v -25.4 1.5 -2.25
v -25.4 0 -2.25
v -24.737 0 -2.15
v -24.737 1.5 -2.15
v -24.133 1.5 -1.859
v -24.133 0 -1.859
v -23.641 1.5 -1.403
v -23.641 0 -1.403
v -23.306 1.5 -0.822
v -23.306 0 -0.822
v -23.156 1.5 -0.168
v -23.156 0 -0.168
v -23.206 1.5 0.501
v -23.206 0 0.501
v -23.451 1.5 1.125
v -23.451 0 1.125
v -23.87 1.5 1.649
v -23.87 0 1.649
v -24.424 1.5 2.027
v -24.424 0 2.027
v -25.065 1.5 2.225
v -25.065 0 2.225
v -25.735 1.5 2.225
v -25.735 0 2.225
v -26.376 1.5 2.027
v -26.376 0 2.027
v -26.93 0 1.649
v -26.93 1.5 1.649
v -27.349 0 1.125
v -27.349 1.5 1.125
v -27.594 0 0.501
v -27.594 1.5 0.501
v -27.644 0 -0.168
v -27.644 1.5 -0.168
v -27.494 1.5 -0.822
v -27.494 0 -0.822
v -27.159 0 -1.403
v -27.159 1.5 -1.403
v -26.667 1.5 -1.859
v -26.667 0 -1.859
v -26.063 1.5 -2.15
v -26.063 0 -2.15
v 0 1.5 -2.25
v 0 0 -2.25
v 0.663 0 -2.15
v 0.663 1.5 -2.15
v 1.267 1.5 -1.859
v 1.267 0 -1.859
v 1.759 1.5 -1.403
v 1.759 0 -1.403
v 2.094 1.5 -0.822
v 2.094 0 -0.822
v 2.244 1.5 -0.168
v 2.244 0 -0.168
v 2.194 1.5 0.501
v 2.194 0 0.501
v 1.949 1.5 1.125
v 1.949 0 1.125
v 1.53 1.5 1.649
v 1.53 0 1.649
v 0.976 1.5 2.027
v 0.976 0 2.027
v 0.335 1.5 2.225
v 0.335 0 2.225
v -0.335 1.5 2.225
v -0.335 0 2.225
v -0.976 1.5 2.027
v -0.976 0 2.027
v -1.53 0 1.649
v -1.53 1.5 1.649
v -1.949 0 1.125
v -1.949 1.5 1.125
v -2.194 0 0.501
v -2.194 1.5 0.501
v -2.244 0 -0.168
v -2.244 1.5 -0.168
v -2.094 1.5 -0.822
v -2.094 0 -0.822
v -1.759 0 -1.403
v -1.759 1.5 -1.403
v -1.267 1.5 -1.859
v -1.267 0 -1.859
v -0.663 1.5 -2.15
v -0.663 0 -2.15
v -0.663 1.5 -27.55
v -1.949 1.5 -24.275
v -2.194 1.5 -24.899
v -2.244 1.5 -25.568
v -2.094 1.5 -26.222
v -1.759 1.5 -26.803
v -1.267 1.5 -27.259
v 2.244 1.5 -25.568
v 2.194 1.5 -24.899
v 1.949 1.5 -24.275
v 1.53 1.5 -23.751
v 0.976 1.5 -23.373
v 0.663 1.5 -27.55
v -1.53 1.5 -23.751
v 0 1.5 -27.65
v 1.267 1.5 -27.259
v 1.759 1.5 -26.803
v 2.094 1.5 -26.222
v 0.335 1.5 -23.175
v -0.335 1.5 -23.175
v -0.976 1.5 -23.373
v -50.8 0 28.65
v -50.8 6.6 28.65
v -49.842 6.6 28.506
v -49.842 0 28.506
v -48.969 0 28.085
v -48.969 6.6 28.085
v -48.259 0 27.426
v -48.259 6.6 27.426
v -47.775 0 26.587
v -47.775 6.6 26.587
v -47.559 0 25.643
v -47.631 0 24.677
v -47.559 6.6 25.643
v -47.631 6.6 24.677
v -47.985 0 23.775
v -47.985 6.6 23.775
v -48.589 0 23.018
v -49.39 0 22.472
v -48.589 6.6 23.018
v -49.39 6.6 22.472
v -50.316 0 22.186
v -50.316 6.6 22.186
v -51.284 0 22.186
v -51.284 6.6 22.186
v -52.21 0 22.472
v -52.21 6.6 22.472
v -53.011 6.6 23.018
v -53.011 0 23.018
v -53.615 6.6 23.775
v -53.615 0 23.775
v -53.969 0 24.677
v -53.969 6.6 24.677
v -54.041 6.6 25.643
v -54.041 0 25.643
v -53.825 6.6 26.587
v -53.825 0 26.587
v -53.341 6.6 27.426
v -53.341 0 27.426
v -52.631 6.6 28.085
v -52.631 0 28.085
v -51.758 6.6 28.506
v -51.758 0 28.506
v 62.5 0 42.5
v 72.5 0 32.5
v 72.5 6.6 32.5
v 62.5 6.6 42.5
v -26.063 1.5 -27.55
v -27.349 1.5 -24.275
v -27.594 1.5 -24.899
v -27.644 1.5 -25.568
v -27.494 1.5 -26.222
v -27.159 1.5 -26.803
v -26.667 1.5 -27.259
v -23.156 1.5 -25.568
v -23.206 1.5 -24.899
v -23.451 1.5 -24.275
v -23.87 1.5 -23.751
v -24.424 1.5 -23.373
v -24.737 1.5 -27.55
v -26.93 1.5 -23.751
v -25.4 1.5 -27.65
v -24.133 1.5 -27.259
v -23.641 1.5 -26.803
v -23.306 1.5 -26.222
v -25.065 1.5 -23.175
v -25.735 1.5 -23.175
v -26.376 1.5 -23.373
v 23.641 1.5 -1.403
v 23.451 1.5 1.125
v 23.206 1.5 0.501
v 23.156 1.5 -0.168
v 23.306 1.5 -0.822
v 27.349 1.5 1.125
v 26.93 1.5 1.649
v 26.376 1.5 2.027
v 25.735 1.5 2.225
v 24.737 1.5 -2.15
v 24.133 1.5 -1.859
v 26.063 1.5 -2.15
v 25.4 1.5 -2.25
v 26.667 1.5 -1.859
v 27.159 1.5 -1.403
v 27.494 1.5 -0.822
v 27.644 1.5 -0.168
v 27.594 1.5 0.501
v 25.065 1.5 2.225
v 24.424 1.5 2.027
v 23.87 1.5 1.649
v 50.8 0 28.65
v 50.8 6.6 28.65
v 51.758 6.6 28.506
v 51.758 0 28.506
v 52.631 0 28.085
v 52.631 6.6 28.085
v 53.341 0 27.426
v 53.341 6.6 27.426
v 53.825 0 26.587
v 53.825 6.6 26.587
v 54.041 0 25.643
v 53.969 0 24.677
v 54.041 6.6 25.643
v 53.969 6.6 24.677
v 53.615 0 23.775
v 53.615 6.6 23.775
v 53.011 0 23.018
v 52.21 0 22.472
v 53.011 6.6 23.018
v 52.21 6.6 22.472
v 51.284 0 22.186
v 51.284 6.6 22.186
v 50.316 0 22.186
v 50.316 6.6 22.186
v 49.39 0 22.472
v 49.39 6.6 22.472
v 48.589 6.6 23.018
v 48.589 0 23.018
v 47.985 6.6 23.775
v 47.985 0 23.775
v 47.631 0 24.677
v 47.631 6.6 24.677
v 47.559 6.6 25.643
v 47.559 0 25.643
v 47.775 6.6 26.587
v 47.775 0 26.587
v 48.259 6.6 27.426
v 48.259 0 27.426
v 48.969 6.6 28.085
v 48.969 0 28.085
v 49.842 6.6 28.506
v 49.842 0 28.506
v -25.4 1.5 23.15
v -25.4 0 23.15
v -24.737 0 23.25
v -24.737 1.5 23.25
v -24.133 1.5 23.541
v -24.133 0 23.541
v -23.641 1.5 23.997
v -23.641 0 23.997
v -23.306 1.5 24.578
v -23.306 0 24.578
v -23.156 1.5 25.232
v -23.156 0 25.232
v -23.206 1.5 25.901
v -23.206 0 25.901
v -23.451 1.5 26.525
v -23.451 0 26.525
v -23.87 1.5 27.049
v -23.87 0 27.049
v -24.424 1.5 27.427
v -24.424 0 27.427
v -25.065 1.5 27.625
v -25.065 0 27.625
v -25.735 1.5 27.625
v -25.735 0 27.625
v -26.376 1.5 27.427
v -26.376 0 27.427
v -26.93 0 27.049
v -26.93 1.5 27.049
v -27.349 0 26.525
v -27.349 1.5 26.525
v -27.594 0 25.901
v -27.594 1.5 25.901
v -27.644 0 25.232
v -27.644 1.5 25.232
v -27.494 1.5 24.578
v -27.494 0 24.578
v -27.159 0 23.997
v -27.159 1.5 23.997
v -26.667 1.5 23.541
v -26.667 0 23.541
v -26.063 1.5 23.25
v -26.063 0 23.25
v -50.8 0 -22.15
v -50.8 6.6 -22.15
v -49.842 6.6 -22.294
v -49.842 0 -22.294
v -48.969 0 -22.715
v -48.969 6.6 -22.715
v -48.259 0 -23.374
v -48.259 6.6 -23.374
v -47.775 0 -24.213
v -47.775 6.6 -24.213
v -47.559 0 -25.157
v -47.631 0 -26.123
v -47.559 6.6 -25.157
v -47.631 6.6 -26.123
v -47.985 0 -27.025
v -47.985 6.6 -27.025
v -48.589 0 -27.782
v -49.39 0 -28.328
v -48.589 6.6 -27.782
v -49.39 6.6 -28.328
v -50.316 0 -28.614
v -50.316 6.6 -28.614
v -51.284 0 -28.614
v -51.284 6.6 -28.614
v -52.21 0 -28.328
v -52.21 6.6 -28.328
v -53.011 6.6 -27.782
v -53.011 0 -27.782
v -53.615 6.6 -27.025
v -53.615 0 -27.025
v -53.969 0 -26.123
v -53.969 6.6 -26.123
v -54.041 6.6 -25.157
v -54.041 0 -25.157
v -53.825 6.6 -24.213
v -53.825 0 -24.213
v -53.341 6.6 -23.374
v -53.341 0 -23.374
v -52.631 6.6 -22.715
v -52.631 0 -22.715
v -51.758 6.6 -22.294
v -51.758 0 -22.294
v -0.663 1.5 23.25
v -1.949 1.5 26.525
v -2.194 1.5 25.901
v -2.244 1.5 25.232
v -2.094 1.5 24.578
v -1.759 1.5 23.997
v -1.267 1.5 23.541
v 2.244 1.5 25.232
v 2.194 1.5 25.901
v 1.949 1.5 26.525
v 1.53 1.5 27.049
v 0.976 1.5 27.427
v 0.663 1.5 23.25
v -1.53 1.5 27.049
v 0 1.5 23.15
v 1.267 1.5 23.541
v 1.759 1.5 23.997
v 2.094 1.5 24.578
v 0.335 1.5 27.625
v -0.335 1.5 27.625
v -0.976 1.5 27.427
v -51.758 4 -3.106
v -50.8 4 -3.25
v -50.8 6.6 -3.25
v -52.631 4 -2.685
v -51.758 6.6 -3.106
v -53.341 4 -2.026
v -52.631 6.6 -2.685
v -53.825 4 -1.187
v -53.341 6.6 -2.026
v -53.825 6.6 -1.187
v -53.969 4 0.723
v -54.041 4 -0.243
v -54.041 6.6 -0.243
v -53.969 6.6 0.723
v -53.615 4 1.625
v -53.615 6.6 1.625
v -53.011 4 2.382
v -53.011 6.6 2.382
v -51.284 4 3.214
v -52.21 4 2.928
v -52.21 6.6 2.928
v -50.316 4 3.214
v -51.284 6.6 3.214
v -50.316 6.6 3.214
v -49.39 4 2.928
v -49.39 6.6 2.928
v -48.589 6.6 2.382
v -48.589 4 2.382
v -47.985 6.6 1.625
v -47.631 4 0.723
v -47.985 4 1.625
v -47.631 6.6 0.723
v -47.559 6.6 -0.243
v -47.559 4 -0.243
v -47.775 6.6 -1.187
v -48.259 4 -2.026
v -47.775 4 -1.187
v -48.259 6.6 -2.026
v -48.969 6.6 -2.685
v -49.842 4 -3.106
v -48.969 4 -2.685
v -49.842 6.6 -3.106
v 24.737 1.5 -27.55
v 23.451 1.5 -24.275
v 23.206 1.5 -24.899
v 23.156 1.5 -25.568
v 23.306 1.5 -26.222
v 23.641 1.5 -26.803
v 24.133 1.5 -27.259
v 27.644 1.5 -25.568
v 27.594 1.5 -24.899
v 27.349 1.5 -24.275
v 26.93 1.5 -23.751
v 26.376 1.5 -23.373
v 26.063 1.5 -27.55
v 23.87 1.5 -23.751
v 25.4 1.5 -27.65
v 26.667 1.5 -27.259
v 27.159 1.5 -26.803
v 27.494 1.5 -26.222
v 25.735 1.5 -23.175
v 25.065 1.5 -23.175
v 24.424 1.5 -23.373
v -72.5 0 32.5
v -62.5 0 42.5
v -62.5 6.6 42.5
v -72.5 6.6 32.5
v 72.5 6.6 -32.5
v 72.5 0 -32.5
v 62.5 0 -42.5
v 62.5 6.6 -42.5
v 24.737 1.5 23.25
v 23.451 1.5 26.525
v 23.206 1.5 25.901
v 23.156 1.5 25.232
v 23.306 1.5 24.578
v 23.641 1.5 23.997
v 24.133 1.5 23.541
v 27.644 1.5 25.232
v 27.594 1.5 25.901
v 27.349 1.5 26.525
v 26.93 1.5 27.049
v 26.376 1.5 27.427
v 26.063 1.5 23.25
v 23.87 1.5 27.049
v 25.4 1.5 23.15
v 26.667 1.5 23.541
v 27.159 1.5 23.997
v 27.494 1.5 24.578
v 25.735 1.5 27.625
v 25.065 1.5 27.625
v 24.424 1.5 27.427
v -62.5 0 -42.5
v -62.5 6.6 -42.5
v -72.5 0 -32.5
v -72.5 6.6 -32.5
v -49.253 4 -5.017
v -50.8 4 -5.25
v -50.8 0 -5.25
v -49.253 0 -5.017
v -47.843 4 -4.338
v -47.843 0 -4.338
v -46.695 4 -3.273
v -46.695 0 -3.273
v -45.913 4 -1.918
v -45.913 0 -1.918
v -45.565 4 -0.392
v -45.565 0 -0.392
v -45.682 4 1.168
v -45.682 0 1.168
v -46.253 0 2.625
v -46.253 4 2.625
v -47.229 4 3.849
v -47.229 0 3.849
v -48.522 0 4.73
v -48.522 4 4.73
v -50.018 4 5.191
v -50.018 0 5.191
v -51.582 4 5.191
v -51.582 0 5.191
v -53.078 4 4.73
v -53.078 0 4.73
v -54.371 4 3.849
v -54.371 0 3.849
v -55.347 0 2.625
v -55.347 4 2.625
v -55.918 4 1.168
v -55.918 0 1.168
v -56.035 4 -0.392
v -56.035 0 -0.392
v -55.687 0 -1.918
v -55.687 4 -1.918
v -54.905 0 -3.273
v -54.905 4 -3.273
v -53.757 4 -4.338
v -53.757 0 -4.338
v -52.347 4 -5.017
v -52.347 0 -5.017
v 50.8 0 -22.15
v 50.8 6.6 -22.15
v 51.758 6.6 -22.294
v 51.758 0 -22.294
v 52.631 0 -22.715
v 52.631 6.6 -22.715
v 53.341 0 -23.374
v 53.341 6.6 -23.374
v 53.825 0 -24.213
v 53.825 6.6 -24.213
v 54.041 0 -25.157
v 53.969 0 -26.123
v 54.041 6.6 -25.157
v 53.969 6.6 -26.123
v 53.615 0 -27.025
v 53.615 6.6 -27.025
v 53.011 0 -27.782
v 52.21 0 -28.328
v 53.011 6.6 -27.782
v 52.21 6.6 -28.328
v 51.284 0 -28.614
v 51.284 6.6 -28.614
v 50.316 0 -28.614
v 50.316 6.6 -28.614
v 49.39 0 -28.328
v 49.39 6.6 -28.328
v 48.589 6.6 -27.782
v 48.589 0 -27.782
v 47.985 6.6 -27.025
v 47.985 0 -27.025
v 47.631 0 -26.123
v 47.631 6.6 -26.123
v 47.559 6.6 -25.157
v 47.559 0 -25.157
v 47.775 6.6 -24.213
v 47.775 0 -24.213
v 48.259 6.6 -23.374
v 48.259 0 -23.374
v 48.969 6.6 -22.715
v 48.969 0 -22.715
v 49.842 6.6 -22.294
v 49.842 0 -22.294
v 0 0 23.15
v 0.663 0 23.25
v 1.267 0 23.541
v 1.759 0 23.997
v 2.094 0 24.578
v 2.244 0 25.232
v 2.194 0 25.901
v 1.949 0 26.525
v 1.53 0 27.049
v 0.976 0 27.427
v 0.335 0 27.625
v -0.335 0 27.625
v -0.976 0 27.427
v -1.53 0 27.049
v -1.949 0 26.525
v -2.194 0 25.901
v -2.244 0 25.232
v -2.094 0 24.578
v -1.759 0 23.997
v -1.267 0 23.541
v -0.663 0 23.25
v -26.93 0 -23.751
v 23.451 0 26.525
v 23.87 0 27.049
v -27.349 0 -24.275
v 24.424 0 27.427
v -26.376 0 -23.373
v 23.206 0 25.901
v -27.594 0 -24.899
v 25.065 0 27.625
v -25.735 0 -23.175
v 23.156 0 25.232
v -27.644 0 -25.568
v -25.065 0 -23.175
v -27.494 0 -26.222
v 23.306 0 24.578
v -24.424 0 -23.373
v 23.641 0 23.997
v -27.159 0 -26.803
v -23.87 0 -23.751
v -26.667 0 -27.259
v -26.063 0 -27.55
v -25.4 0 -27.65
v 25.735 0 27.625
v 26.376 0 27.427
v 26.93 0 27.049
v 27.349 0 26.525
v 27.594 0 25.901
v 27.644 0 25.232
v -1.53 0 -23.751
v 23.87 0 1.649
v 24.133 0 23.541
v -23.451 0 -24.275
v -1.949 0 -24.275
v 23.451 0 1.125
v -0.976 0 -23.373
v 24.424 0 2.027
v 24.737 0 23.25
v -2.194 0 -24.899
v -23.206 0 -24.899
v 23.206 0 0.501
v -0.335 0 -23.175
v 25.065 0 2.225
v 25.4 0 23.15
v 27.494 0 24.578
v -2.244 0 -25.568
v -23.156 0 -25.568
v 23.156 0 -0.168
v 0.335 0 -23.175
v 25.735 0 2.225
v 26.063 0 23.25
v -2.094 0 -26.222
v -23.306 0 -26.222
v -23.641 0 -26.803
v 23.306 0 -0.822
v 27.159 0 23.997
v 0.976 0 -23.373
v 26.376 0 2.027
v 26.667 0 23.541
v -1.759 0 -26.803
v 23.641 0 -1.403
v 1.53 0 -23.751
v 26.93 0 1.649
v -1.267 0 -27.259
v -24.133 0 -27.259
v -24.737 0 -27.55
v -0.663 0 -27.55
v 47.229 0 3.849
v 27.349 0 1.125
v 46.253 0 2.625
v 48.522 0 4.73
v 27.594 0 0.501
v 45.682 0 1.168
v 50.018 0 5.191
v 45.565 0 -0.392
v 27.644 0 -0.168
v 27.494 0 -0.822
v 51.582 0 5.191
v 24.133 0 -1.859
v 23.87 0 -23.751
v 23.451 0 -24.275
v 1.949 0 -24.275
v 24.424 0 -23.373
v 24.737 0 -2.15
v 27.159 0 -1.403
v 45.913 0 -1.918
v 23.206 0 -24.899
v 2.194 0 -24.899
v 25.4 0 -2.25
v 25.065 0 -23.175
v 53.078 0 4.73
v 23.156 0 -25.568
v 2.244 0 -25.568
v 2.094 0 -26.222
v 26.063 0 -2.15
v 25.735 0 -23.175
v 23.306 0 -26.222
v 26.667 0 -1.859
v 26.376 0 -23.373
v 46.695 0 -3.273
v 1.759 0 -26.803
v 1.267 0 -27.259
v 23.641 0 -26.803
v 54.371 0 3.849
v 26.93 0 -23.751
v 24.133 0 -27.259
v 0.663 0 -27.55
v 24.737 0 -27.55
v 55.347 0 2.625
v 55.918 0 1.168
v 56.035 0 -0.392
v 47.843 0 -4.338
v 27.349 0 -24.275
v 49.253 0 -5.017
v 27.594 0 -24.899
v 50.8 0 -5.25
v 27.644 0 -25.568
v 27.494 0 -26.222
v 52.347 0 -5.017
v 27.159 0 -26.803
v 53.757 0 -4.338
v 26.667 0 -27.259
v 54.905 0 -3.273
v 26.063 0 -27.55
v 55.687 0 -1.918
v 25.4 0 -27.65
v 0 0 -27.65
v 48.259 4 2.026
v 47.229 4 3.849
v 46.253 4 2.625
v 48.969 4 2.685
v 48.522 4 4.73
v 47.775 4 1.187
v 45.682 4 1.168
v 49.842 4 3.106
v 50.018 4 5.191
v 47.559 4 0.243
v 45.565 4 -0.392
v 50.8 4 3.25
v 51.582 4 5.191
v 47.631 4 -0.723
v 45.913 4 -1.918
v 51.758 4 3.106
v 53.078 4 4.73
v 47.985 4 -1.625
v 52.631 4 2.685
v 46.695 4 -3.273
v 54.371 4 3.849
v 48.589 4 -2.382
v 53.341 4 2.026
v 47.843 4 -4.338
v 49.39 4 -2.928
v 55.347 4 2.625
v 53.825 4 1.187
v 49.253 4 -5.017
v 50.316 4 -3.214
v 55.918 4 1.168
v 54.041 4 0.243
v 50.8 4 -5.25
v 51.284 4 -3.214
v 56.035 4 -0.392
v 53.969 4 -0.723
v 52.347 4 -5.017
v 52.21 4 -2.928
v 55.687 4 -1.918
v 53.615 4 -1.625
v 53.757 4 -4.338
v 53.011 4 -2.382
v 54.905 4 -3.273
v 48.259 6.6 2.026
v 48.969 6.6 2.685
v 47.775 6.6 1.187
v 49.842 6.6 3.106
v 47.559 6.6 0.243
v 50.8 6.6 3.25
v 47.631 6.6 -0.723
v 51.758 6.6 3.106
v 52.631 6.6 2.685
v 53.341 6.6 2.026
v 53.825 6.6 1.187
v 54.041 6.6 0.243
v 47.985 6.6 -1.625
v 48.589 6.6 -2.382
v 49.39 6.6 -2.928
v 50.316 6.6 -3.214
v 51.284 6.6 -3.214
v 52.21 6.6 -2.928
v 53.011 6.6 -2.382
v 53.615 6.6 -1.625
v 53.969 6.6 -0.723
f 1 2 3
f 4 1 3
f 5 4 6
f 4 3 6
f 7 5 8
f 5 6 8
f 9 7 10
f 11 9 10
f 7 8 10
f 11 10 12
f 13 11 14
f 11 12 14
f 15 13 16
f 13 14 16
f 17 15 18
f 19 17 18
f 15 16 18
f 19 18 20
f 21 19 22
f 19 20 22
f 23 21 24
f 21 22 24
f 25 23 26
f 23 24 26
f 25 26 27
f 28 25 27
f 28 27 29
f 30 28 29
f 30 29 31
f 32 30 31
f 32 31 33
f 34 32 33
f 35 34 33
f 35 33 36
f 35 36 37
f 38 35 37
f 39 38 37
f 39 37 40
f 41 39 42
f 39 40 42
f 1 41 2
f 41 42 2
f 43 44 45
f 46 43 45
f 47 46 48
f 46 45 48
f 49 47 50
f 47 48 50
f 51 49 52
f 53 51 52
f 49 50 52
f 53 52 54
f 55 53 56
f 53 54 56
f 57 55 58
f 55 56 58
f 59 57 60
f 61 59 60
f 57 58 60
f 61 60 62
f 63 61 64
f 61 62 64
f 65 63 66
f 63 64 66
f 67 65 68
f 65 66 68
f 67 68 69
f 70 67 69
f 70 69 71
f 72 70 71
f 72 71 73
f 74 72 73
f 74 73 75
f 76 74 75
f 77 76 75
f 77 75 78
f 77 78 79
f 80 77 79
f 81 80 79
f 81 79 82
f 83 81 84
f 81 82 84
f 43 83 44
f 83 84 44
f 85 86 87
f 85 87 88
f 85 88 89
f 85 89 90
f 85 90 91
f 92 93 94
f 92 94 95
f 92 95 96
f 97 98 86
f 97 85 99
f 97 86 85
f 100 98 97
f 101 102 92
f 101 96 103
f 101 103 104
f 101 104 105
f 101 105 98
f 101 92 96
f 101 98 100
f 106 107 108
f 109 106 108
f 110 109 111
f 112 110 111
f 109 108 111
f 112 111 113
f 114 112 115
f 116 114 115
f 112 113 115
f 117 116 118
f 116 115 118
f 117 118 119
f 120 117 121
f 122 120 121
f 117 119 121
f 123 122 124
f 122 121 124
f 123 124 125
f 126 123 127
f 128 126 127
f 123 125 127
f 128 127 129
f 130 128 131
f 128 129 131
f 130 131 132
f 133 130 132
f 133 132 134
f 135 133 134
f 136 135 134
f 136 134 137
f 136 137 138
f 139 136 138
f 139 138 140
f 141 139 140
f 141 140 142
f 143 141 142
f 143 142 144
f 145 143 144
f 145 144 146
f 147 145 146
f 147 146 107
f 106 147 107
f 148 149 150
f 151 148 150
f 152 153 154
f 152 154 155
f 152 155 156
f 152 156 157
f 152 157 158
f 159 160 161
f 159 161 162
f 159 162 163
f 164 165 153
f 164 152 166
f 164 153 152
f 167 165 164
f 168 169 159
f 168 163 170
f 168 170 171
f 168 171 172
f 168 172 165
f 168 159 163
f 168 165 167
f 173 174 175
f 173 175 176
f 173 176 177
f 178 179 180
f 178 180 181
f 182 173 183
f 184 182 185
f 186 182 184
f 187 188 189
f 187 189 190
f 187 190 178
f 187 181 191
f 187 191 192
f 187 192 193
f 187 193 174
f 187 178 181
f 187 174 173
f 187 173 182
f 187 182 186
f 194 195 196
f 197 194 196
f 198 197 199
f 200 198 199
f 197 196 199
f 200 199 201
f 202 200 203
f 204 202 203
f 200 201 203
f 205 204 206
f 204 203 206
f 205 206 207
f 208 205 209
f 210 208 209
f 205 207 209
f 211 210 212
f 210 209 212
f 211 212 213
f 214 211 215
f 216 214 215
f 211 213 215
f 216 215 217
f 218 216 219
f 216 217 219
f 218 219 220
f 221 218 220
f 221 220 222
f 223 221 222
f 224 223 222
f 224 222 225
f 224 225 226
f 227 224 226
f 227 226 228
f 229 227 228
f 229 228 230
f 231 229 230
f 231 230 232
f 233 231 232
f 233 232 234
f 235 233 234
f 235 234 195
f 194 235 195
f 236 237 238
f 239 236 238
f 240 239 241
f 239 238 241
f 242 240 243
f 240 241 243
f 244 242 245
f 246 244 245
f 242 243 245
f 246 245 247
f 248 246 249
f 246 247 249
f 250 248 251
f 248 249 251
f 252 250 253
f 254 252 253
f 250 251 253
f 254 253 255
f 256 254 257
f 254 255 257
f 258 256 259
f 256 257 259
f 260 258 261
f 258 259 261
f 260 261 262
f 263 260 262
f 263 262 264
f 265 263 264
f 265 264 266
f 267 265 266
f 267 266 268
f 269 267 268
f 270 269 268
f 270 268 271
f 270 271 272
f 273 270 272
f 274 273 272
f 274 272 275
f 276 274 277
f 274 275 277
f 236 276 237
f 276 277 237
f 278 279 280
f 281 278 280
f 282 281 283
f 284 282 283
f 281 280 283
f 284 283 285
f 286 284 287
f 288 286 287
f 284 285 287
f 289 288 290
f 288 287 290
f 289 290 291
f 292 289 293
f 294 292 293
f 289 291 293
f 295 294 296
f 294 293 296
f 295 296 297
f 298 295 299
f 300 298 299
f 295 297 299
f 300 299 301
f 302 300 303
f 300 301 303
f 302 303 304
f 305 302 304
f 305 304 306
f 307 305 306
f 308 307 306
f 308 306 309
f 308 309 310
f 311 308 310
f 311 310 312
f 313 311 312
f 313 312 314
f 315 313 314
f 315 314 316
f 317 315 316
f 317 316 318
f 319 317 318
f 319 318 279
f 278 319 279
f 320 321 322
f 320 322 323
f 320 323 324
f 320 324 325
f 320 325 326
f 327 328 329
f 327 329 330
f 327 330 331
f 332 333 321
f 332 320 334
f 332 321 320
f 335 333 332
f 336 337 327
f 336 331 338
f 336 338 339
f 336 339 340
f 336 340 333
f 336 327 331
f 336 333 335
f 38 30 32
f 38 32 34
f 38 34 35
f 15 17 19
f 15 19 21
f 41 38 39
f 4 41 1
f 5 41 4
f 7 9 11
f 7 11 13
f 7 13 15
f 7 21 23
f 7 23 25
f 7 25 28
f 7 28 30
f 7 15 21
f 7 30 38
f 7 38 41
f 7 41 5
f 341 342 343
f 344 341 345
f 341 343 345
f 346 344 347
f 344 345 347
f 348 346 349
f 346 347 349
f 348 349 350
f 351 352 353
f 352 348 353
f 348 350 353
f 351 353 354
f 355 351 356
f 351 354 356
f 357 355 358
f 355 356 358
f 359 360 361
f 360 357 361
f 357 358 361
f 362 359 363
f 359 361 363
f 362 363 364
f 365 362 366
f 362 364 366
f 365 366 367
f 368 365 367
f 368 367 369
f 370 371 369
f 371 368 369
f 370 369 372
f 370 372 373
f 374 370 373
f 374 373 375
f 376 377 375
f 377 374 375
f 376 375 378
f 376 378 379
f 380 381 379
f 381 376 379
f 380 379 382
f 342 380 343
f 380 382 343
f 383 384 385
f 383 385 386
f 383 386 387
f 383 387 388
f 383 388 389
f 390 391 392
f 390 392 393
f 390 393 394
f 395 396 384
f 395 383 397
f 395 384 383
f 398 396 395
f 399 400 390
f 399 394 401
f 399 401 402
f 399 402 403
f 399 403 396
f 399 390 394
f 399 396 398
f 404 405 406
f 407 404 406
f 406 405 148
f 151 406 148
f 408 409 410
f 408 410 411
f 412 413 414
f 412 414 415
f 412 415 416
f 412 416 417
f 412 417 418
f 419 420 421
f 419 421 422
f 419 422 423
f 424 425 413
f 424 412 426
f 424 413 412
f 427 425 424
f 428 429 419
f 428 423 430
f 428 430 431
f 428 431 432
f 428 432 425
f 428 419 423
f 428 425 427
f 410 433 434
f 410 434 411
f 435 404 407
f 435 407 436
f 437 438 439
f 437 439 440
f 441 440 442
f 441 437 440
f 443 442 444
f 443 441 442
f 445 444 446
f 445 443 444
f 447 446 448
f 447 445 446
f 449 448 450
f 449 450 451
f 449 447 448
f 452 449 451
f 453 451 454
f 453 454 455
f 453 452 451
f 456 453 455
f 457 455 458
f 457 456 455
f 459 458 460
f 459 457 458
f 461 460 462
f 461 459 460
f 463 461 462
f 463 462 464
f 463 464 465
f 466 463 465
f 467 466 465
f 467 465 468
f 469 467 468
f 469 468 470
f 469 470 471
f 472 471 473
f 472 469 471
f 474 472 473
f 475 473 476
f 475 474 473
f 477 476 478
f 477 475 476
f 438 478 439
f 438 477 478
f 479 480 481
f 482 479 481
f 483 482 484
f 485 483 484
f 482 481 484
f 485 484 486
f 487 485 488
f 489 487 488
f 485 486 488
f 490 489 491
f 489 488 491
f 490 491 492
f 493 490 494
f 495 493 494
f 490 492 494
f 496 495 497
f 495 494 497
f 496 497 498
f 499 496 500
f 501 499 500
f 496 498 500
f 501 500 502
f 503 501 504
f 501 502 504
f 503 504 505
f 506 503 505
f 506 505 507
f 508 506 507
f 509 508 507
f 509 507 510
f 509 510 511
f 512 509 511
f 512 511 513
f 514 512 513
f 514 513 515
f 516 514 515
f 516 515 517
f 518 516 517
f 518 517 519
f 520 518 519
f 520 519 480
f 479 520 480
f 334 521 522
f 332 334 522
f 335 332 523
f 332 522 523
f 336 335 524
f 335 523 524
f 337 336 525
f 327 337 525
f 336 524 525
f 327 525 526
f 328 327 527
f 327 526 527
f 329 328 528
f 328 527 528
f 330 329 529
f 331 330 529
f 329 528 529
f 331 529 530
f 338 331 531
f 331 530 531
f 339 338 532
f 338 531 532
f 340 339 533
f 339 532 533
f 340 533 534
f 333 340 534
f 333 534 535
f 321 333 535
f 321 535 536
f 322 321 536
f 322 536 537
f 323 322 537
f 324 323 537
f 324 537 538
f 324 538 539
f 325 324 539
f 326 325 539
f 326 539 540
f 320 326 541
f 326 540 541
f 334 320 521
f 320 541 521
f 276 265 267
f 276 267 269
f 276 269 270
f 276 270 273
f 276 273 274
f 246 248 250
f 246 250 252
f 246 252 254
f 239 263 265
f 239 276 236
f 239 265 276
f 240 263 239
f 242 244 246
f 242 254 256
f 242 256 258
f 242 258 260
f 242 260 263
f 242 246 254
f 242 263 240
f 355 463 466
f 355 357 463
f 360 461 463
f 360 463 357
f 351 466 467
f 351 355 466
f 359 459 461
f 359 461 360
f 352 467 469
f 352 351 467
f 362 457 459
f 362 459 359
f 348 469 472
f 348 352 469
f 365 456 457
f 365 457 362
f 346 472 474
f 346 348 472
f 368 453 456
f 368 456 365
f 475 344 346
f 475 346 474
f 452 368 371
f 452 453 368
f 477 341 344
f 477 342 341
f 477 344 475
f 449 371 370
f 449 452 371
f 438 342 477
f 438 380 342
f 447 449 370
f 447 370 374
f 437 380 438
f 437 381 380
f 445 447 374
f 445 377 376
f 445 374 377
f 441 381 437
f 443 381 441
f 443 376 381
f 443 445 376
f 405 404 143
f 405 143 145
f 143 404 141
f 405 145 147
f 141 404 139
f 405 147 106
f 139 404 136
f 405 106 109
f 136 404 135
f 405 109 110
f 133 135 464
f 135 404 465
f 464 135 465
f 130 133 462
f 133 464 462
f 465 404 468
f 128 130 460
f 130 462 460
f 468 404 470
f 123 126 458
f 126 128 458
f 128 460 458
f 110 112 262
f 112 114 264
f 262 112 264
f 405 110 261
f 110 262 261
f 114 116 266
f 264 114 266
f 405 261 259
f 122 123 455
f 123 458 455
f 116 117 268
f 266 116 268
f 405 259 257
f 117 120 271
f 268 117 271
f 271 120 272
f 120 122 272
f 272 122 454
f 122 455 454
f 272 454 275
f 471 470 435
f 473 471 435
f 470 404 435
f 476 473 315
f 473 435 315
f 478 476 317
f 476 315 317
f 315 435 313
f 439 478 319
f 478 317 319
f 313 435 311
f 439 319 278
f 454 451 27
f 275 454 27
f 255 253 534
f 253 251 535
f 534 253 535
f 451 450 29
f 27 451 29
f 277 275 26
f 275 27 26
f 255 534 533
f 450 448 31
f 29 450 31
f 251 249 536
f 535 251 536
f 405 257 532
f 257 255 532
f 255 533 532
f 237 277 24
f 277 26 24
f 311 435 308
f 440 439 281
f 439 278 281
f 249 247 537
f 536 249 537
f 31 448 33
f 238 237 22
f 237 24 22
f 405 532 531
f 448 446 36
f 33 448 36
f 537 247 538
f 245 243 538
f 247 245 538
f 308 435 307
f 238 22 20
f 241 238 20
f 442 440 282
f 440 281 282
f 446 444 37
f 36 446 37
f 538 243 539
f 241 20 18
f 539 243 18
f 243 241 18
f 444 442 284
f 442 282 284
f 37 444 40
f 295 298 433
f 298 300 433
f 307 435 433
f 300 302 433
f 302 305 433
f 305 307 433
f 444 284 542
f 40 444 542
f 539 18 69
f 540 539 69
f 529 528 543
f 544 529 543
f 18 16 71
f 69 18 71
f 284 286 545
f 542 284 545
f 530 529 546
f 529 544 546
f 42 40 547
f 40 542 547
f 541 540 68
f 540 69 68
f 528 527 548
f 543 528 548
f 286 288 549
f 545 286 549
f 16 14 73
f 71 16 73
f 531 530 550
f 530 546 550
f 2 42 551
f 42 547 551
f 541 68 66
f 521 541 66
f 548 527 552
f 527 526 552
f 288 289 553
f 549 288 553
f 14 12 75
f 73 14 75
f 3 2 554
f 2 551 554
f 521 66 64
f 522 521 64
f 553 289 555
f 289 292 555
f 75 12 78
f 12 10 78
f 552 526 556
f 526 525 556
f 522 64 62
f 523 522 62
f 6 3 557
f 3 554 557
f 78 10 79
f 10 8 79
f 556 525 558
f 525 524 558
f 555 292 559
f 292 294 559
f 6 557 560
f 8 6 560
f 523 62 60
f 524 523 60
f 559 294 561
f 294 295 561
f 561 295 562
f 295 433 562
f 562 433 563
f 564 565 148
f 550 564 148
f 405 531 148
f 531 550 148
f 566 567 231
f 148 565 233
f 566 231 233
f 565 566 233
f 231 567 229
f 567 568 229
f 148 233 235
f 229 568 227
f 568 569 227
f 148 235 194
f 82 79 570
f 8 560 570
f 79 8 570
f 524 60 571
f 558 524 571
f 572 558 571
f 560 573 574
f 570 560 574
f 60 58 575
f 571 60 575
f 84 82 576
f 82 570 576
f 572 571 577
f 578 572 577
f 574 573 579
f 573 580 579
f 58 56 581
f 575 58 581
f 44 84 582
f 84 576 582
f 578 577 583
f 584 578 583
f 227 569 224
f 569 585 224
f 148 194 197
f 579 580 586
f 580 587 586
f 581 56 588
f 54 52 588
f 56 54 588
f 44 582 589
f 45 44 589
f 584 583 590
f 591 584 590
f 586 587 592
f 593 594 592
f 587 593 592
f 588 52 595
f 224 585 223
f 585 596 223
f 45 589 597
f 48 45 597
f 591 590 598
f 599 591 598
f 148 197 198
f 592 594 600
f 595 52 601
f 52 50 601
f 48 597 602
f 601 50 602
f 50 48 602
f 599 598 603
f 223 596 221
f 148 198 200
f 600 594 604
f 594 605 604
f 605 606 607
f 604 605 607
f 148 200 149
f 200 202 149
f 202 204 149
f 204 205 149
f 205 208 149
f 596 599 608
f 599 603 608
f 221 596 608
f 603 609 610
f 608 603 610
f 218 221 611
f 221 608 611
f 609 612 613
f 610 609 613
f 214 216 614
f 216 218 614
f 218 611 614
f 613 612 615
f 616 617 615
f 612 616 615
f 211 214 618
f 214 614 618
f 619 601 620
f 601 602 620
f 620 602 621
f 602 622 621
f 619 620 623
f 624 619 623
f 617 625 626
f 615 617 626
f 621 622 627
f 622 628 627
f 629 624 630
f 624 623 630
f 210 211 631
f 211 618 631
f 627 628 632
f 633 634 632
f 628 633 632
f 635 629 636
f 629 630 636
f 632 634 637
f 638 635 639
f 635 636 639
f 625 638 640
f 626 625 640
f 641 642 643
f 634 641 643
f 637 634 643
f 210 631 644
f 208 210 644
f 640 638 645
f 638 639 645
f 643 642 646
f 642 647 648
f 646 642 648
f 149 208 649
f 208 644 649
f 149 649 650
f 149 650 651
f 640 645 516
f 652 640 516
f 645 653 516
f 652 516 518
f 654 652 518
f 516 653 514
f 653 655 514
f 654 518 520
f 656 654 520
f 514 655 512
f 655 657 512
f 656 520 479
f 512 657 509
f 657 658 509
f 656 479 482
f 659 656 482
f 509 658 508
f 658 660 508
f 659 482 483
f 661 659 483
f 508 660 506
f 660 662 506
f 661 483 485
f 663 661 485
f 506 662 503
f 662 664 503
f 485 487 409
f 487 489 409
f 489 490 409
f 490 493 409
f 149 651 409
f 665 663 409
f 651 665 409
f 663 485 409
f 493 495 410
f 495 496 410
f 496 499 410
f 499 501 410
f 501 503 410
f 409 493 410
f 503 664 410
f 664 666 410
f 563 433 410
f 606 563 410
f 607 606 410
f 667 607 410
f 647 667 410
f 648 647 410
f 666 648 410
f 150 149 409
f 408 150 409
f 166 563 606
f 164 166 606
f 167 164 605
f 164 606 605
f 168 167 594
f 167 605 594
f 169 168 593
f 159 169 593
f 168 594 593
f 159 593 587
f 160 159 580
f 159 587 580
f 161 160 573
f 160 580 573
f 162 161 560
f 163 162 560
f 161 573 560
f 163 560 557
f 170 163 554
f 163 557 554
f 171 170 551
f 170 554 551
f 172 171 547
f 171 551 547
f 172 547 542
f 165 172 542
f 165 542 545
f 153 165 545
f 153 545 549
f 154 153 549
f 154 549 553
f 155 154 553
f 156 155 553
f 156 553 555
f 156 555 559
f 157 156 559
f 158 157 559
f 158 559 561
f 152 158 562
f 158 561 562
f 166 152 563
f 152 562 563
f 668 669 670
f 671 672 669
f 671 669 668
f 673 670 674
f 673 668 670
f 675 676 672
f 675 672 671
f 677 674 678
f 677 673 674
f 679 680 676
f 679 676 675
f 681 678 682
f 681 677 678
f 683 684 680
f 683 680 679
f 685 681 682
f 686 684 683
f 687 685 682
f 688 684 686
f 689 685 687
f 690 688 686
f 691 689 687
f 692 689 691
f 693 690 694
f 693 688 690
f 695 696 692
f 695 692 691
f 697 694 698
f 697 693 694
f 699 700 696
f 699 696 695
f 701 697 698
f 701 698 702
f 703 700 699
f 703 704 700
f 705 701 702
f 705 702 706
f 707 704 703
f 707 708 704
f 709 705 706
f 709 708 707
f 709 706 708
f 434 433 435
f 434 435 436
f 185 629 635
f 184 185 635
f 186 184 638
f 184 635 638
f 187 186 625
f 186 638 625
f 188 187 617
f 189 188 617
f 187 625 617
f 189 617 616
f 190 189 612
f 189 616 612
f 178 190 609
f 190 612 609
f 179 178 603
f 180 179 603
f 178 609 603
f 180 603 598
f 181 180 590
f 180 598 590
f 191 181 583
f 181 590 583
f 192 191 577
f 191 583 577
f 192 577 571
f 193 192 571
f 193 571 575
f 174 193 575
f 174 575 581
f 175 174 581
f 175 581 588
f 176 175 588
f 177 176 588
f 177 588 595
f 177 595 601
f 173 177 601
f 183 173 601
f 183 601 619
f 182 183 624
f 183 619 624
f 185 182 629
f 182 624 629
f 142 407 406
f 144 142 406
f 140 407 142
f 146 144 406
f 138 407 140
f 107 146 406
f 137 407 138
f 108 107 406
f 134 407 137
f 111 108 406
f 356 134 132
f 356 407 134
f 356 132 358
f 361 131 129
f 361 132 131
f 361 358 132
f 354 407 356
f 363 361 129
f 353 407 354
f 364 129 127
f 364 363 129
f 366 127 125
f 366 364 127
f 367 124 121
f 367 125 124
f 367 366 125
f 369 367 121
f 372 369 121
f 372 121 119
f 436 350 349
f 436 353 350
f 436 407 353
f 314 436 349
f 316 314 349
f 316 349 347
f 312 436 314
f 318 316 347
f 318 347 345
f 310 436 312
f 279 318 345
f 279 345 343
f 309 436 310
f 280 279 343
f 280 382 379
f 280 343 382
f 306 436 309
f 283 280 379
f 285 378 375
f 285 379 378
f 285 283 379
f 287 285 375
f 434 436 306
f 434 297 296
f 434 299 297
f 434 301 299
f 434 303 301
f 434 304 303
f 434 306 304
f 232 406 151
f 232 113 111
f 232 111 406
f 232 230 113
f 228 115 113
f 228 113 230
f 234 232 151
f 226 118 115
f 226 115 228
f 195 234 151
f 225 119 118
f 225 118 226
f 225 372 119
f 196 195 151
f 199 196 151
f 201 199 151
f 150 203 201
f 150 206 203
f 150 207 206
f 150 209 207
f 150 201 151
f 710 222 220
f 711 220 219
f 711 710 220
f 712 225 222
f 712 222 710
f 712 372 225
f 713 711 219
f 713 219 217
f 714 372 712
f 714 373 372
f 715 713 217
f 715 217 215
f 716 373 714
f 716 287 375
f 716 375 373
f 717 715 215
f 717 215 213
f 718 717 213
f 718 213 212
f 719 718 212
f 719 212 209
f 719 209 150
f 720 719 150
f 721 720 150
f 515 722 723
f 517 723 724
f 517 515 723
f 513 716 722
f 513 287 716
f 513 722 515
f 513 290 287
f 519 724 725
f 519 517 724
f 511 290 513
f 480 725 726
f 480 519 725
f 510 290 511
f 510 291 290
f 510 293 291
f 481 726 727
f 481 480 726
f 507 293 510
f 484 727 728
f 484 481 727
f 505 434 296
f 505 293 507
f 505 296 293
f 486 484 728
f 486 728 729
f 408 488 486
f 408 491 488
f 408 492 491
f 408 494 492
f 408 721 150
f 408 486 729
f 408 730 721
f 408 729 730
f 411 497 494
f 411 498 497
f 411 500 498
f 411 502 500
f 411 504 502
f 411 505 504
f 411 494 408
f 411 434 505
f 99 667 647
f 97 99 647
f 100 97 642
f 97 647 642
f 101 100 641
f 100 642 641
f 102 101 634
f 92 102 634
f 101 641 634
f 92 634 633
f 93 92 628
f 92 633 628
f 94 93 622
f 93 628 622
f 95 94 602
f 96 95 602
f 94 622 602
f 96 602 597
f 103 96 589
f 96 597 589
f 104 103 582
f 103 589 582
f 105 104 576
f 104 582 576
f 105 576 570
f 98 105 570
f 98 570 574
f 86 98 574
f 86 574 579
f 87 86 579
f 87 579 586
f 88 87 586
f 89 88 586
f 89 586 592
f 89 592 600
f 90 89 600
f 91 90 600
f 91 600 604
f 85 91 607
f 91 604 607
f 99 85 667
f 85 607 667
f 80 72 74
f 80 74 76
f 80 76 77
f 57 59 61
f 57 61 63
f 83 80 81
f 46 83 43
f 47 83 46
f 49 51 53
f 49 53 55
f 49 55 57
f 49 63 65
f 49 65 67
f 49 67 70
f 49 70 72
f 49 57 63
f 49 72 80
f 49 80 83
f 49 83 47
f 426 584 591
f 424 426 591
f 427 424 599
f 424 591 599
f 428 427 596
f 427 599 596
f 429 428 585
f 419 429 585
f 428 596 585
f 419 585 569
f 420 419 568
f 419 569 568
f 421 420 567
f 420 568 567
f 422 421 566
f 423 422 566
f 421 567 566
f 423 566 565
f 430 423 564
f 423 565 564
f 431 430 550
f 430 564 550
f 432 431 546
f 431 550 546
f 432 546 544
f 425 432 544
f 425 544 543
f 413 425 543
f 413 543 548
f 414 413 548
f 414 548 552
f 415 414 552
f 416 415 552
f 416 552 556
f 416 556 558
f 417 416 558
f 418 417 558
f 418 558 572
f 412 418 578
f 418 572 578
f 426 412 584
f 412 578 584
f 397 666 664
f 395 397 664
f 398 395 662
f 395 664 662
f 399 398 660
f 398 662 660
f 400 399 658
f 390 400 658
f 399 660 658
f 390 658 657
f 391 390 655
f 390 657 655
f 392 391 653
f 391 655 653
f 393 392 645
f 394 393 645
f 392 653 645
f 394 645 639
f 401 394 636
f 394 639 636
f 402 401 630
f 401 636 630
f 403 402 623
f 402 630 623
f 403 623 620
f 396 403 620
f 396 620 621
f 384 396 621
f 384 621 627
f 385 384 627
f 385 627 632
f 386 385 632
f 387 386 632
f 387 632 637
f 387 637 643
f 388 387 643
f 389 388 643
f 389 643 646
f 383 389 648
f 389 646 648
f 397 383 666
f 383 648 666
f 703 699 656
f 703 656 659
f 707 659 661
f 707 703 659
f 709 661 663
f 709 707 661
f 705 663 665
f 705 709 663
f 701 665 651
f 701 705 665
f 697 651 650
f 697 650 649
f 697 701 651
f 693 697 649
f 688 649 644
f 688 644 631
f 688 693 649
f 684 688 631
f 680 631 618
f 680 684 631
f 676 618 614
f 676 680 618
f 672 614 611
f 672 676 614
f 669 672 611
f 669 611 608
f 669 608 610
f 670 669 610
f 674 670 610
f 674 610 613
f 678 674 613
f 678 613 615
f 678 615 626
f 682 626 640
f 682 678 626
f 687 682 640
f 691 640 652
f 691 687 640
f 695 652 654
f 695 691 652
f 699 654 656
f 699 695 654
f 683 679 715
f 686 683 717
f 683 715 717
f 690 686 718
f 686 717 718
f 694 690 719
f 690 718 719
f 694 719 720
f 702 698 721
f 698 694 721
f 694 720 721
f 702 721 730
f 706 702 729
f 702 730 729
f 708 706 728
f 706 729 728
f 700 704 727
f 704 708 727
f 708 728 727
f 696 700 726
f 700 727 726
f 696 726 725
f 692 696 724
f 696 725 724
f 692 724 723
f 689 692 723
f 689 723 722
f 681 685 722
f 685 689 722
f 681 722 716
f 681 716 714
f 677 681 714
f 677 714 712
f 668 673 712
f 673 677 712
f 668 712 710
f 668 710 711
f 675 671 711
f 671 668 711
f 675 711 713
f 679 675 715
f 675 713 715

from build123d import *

# Parameters (mm, degrees)
SKETCH1_W           = 145
SKETCH1_H           = 85
BOSS_EXTRUDE1_DEPTH = 6.6
SKETCH2_R           = 3.25
CUT_EXTRUDE1_DEPTH  = 85.297449546
CHAMFER1_SIZE       = 10
CUT_EXTRUDE2_START  = -4
SKETCH3_R           = 5.25
SKETCH3_R_2         = 3.25
CUT_EXTRUDE2_DEPTH  = 4
SKETCH4_R           = 2.25
CUT_EXTRUDE3_DEPTH  = 1.5


with BuildPart() as part:
    # Sketch1 → Boss-Extrude1 (new body)
    with BuildSketch(Plane(origin=(0, 0, 0), x_dir=(1, 0, 0), z_dir=(0, 1, 0))):
        Rectangle(SKETCH1_W, SKETCH1_H)
    extrude(amount=BOSS_EXTRUDE1_DEPTH)

    # Sketch2 → Cut-Extrude1 (cut, through all)
    with BuildSketch(Plane(origin=(0, 6.6, 0), x_dir=(1, 0, 0), z_dir=(0, 1, 0))):
        with Locations(Location((-50.8, 25.4, 0), (0, 0, 270))):
            Circle(SKETCH2_R)
        with Locations(Location((50.8, 25.4, 0), (0, 0, 270))):
            Circle(SKETCH2_R)
        with Locations(Location((50.8, -25.4, 0), (0, 0, 270))):
            Circle(SKETCH2_R)
        with Locations(Location((-50.8, -25.4, 0), (0, 0, 270))):
            Circle(SKETCH2_R)
        with Locations(Location((50.8, 0, 0), (0, 0, 270))):
            Circle(SKETCH2_R)
        with Locations(Location((-50.8, 0, 0), (0, 0, 90))):
            Circle(SKETCH2_R)
    extrude(amount=-CUT_EXTRUDE1_DEPTH, mode=Mode.SUBTRACT)

    # Chamfer1
    chamfer1_edges = [part.edges().sort_by_distance(p)[0] for p in [
        (72.5, 3.3, 42.5),
        (-72.5, 3.3, 42.5),
        (-72.5, 3.3, -42.5),
        (72.5, 3.3, -42.5),
    ]]
    chamfer(chamfer1_edges, length=CHAMFER1_SIZE)

    # Sketch3 → Cut-Extrude2 (cut)
    # profile 1 of 2: a face of its own
    with BuildSketch(Plane.XZ.offset(CUT_EXTRUDE2_START)):
        with Locations(Location((50.8, 0, 0), (0, 0, 270))):
            Circle(SKETCH3_R)
        with Locations(Location((50.8, 0, 0), (0, 0, 90))):
            Circle(SKETCH3_R_2, mode=Mode.SUBTRACT)
    # profile 2 of 2: a face of its own
    with BuildSketch(Plane.XZ.offset(CUT_EXTRUDE2_START)):
        with Locations(Location((-50.8, 0, 0), (0, 0, 270))):
            Circle(SKETCH3_R)
        with Locations(Location((-50.8, 0, 0), (0, 0, 270))):
            Circle(SKETCH3_R_2, mode=Mode.SUBTRACT)
    extrude(amount=CUT_EXTRUDE2_DEPTH, mode=Mode.SUBTRACT)

    # Sketch4 → Cut-Extrude3 (cut)
    with BuildSketch(Plane.XZ):
        with Locations(Location((-25.4, 25.4, 0), (0, 0, 270))):
            Circle(SKETCH4_R)
        with Locations(Location((0, 25.4, 0), (0, 0, 270))):
            Circle(SKETCH4_R)
        with Locations(Location((25.4, 25.4, 0), (0, 0, 270))):
            Circle(SKETCH4_R)
        with Locations(Location((-25.4, 0, 0), (0, 0, 270))):
            Circle(SKETCH4_R)
        with Locations(Location((0, 0, 0), (0, 0, 270))):
            Circle(SKETCH4_R)
        with Locations(Location((25.4, 0, 0), (0, 0, 270))):
            Circle(SKETCH4_R)
        with Locations(Location((-25.4, -25.4, 0), (0, 0, 270))):
            Circle(SKETCH4_R)
        with Locations(Location((0, -25.4, 0), (0, 0, 270))):
            Circle(SKETCH4_R)
        with Locations(Location((25.4, -25.4, 0), (0, 0, 270))):
            Circle(SKETCH4_R)
    extrude(amount=-CUT_EXTRUDE3_DEPTH, mode=Mode.SUBTRACT)


solid = part.part
